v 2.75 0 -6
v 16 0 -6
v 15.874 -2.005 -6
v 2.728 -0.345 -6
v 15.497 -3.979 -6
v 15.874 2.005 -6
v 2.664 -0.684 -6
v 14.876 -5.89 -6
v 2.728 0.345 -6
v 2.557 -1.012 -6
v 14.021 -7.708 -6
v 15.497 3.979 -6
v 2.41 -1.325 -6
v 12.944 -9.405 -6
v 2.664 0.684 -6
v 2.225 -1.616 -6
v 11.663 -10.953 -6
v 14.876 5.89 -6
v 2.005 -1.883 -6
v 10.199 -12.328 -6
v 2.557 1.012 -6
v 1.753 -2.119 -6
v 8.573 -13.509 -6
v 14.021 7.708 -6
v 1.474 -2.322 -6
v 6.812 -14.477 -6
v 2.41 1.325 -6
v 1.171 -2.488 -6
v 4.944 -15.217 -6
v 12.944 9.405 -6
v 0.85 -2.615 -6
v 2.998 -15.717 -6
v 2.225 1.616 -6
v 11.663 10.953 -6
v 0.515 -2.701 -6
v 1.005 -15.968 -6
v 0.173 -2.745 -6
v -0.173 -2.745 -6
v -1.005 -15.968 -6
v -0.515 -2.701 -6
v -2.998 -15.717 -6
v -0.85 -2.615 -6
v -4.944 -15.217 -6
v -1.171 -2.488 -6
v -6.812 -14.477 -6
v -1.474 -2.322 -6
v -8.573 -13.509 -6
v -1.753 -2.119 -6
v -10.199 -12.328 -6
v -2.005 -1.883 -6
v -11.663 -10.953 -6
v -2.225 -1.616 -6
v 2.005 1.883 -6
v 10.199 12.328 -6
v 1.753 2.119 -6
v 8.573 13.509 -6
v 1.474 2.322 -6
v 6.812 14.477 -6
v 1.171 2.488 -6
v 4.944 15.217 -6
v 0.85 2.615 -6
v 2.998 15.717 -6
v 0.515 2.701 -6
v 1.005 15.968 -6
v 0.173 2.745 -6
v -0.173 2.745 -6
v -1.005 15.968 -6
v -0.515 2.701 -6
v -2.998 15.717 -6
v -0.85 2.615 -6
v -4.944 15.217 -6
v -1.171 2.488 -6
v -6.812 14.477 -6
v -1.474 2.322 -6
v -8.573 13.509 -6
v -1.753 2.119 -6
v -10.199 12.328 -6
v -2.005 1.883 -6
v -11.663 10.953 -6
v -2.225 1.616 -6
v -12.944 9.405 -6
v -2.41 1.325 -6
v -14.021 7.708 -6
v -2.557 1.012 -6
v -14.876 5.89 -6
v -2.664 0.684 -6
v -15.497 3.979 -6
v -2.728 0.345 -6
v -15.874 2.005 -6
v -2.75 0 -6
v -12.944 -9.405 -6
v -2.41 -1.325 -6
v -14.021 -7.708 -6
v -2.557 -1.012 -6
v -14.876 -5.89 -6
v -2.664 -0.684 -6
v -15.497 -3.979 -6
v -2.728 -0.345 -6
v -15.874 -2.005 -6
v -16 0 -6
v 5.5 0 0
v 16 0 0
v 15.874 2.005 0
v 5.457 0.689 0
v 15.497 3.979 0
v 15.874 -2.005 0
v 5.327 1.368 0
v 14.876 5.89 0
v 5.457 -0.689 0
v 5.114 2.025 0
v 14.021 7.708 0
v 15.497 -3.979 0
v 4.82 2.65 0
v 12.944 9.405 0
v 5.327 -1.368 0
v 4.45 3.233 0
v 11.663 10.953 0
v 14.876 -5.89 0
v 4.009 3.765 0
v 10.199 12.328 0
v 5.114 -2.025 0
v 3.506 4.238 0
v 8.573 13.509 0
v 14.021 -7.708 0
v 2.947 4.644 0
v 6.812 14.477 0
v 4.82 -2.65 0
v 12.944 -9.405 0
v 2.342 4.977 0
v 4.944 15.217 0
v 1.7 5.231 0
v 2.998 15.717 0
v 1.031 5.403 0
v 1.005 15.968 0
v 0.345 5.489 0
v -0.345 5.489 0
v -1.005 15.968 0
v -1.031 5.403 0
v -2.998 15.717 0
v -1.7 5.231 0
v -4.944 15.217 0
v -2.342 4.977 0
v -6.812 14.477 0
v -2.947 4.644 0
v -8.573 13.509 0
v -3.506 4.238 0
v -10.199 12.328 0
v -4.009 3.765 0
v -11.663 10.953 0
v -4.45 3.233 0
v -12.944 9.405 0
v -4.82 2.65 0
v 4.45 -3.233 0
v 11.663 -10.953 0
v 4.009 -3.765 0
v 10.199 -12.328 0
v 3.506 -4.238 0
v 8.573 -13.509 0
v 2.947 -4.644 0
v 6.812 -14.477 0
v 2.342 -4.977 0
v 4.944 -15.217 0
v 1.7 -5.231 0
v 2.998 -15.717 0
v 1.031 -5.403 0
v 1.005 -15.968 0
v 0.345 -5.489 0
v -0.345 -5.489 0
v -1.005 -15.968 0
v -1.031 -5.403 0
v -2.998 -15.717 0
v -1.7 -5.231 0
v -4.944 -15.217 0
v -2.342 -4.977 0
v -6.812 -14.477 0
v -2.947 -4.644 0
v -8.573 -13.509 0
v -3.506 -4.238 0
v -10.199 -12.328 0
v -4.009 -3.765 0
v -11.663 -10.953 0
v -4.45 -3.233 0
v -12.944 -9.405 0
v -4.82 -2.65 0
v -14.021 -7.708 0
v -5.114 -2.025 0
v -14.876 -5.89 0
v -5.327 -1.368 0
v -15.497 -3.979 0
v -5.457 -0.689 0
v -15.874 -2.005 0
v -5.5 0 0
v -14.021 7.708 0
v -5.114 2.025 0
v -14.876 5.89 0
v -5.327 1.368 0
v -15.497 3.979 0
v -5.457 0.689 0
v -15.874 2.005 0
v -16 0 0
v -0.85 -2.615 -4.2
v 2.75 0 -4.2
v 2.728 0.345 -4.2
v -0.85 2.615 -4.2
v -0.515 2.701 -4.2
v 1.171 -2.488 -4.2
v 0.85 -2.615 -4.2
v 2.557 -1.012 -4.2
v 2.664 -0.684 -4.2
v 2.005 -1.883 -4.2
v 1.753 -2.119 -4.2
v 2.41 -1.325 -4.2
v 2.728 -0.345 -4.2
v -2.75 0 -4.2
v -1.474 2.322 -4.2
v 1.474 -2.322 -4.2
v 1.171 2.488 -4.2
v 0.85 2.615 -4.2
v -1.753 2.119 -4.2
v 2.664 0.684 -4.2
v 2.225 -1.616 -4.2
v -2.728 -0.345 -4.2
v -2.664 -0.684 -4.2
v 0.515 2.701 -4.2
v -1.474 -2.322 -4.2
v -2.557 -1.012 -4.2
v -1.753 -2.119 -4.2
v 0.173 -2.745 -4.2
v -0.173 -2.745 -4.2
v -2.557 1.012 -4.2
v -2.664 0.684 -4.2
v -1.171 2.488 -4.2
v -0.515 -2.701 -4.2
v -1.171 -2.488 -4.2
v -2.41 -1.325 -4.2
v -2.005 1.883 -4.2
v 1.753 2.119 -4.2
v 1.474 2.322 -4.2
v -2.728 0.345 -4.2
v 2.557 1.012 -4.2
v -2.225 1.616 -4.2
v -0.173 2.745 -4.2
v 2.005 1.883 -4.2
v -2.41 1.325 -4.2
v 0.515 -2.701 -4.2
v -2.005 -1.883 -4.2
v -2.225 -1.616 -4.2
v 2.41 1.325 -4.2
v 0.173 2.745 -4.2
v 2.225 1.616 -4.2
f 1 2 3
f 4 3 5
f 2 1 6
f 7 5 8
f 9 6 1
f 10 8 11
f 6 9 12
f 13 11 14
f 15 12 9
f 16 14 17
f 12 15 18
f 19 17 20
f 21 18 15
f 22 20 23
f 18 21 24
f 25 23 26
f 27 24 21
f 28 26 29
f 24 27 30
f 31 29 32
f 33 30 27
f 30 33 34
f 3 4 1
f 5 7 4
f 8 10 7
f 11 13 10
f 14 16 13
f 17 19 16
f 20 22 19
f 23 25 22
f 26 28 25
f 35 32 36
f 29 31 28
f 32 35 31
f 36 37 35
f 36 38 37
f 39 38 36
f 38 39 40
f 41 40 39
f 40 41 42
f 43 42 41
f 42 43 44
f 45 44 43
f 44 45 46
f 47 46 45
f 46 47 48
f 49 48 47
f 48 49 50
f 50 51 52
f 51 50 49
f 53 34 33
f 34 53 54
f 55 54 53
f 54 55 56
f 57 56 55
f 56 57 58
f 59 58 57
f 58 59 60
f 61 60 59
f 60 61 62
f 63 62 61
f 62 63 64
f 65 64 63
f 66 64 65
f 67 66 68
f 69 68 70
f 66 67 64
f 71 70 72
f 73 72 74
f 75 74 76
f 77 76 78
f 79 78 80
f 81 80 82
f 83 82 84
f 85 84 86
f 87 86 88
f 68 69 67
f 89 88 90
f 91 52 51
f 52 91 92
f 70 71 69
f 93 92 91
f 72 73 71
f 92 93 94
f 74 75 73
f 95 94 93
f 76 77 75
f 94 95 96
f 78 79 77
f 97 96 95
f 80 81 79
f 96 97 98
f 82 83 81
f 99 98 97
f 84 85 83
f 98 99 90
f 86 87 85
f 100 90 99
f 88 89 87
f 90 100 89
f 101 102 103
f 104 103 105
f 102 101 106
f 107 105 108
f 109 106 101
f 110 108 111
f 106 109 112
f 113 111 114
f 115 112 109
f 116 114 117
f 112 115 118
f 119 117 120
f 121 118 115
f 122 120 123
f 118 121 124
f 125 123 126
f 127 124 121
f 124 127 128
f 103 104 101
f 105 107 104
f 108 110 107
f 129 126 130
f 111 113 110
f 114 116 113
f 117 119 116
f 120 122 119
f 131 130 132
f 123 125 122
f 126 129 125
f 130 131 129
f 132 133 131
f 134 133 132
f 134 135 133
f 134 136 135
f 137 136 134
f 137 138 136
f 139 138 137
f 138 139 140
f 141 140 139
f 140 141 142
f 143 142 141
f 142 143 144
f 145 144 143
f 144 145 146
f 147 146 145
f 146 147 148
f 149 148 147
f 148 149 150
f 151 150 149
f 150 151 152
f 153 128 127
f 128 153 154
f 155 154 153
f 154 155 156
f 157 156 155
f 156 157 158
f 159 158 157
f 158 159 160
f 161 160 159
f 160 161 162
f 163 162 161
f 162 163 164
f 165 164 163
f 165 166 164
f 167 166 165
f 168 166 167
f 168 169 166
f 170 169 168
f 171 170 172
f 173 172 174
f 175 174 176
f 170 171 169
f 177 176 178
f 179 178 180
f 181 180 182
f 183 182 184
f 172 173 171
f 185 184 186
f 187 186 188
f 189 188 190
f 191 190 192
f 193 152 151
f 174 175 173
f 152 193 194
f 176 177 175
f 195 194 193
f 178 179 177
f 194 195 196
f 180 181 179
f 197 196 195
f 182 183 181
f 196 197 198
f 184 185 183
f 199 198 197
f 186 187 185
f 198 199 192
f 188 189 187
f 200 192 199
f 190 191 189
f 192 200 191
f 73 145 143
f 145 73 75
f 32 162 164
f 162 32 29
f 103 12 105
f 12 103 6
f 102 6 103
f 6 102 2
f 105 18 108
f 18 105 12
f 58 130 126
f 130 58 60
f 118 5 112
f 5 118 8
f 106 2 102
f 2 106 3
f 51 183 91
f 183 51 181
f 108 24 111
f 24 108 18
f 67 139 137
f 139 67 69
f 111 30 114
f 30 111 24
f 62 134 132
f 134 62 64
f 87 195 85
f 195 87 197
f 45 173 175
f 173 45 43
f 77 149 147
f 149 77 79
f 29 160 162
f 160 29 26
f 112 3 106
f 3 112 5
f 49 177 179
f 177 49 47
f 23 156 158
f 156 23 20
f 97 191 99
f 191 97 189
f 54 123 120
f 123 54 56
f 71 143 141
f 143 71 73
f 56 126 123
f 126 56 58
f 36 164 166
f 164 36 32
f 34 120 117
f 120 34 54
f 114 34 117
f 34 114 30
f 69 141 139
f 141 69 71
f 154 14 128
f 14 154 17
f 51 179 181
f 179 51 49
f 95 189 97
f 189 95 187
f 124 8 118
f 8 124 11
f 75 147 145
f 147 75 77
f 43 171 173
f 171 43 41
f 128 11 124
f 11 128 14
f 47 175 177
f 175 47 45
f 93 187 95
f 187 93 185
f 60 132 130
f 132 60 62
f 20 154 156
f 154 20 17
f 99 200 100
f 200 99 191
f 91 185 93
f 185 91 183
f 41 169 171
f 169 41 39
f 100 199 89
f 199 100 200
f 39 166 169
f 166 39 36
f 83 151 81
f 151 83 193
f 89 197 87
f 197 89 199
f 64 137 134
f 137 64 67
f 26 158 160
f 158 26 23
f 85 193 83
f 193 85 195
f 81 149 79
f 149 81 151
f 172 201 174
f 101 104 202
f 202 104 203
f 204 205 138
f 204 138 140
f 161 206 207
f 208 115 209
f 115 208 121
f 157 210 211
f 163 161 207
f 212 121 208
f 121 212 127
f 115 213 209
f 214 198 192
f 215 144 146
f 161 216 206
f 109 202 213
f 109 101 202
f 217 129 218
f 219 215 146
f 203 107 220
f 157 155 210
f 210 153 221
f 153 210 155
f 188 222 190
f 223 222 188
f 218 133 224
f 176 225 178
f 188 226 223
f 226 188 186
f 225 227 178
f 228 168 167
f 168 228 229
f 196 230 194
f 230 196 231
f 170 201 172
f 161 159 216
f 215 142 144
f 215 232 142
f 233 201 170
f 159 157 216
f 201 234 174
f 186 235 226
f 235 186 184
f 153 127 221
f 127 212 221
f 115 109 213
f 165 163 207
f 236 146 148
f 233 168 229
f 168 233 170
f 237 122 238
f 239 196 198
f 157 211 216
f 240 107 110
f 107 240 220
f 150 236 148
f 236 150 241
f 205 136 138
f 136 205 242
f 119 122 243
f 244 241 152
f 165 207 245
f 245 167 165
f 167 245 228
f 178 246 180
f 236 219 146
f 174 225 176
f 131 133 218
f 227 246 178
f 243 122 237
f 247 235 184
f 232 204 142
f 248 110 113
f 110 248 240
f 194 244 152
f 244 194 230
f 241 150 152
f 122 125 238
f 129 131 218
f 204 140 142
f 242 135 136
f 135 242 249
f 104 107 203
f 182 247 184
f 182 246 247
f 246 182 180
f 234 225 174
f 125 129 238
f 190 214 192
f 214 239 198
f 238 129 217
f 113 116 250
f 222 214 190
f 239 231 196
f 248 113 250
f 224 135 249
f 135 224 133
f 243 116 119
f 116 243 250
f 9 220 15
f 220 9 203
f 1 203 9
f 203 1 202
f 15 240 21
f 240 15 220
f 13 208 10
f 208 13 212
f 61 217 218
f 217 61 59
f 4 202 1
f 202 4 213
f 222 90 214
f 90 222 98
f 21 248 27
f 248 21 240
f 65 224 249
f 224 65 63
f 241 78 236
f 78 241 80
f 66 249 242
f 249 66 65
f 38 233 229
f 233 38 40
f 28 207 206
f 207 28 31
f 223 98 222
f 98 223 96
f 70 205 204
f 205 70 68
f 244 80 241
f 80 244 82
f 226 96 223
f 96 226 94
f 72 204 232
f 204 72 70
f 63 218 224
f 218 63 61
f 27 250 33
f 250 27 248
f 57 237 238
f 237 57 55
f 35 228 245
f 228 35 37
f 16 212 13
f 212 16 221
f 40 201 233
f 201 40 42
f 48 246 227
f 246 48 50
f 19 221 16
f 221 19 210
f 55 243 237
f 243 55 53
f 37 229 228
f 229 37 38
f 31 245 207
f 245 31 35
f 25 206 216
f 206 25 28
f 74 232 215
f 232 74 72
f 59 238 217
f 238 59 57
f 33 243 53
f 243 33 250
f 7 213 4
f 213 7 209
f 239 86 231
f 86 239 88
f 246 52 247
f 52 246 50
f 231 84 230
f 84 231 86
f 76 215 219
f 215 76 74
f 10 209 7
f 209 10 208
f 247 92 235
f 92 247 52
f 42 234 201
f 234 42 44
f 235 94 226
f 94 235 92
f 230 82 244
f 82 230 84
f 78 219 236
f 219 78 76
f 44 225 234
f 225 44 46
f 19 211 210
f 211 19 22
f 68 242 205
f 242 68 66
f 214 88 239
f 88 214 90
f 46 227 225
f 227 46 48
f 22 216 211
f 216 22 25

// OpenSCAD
$fn = 50;


difference() {
	union() {
		translate(v = [0, 0, -6.0000000000]) {
			cylinder(h = 6, r = 7.0000000000);
		}
		translate(v = [0, 0, -6.0000000000]) {
			cylinder(h = 6, r = 16.0000000000);
		}
	}
	union() {
		translate(v = [0, 0, 0]) {
			rotate(a = [0, 0, 0]) {
				difference() {
					union() {
						#translate(v = [0, 0, -6.0000000000]) {
							cylinder(h = 6, r = 2.2500000000);
						}
						#translate(v = [0, 0, -4.2000000000]) {
							cylinder(h = 4.2000000000, r1 = 2.7500000000, r2 = 5.5000000000);
						}
						#translate(v = [0, 0, -6.0000000000]) {
							cylinder(h = 6, r = 2.7500000000);
						}
						#translate(v = [0, 0, -6.0000000000]) {
							cylinder(h = 6, r = 2.2500000000);
						}
					}
					union();
				}
			}
		}
	}
}
